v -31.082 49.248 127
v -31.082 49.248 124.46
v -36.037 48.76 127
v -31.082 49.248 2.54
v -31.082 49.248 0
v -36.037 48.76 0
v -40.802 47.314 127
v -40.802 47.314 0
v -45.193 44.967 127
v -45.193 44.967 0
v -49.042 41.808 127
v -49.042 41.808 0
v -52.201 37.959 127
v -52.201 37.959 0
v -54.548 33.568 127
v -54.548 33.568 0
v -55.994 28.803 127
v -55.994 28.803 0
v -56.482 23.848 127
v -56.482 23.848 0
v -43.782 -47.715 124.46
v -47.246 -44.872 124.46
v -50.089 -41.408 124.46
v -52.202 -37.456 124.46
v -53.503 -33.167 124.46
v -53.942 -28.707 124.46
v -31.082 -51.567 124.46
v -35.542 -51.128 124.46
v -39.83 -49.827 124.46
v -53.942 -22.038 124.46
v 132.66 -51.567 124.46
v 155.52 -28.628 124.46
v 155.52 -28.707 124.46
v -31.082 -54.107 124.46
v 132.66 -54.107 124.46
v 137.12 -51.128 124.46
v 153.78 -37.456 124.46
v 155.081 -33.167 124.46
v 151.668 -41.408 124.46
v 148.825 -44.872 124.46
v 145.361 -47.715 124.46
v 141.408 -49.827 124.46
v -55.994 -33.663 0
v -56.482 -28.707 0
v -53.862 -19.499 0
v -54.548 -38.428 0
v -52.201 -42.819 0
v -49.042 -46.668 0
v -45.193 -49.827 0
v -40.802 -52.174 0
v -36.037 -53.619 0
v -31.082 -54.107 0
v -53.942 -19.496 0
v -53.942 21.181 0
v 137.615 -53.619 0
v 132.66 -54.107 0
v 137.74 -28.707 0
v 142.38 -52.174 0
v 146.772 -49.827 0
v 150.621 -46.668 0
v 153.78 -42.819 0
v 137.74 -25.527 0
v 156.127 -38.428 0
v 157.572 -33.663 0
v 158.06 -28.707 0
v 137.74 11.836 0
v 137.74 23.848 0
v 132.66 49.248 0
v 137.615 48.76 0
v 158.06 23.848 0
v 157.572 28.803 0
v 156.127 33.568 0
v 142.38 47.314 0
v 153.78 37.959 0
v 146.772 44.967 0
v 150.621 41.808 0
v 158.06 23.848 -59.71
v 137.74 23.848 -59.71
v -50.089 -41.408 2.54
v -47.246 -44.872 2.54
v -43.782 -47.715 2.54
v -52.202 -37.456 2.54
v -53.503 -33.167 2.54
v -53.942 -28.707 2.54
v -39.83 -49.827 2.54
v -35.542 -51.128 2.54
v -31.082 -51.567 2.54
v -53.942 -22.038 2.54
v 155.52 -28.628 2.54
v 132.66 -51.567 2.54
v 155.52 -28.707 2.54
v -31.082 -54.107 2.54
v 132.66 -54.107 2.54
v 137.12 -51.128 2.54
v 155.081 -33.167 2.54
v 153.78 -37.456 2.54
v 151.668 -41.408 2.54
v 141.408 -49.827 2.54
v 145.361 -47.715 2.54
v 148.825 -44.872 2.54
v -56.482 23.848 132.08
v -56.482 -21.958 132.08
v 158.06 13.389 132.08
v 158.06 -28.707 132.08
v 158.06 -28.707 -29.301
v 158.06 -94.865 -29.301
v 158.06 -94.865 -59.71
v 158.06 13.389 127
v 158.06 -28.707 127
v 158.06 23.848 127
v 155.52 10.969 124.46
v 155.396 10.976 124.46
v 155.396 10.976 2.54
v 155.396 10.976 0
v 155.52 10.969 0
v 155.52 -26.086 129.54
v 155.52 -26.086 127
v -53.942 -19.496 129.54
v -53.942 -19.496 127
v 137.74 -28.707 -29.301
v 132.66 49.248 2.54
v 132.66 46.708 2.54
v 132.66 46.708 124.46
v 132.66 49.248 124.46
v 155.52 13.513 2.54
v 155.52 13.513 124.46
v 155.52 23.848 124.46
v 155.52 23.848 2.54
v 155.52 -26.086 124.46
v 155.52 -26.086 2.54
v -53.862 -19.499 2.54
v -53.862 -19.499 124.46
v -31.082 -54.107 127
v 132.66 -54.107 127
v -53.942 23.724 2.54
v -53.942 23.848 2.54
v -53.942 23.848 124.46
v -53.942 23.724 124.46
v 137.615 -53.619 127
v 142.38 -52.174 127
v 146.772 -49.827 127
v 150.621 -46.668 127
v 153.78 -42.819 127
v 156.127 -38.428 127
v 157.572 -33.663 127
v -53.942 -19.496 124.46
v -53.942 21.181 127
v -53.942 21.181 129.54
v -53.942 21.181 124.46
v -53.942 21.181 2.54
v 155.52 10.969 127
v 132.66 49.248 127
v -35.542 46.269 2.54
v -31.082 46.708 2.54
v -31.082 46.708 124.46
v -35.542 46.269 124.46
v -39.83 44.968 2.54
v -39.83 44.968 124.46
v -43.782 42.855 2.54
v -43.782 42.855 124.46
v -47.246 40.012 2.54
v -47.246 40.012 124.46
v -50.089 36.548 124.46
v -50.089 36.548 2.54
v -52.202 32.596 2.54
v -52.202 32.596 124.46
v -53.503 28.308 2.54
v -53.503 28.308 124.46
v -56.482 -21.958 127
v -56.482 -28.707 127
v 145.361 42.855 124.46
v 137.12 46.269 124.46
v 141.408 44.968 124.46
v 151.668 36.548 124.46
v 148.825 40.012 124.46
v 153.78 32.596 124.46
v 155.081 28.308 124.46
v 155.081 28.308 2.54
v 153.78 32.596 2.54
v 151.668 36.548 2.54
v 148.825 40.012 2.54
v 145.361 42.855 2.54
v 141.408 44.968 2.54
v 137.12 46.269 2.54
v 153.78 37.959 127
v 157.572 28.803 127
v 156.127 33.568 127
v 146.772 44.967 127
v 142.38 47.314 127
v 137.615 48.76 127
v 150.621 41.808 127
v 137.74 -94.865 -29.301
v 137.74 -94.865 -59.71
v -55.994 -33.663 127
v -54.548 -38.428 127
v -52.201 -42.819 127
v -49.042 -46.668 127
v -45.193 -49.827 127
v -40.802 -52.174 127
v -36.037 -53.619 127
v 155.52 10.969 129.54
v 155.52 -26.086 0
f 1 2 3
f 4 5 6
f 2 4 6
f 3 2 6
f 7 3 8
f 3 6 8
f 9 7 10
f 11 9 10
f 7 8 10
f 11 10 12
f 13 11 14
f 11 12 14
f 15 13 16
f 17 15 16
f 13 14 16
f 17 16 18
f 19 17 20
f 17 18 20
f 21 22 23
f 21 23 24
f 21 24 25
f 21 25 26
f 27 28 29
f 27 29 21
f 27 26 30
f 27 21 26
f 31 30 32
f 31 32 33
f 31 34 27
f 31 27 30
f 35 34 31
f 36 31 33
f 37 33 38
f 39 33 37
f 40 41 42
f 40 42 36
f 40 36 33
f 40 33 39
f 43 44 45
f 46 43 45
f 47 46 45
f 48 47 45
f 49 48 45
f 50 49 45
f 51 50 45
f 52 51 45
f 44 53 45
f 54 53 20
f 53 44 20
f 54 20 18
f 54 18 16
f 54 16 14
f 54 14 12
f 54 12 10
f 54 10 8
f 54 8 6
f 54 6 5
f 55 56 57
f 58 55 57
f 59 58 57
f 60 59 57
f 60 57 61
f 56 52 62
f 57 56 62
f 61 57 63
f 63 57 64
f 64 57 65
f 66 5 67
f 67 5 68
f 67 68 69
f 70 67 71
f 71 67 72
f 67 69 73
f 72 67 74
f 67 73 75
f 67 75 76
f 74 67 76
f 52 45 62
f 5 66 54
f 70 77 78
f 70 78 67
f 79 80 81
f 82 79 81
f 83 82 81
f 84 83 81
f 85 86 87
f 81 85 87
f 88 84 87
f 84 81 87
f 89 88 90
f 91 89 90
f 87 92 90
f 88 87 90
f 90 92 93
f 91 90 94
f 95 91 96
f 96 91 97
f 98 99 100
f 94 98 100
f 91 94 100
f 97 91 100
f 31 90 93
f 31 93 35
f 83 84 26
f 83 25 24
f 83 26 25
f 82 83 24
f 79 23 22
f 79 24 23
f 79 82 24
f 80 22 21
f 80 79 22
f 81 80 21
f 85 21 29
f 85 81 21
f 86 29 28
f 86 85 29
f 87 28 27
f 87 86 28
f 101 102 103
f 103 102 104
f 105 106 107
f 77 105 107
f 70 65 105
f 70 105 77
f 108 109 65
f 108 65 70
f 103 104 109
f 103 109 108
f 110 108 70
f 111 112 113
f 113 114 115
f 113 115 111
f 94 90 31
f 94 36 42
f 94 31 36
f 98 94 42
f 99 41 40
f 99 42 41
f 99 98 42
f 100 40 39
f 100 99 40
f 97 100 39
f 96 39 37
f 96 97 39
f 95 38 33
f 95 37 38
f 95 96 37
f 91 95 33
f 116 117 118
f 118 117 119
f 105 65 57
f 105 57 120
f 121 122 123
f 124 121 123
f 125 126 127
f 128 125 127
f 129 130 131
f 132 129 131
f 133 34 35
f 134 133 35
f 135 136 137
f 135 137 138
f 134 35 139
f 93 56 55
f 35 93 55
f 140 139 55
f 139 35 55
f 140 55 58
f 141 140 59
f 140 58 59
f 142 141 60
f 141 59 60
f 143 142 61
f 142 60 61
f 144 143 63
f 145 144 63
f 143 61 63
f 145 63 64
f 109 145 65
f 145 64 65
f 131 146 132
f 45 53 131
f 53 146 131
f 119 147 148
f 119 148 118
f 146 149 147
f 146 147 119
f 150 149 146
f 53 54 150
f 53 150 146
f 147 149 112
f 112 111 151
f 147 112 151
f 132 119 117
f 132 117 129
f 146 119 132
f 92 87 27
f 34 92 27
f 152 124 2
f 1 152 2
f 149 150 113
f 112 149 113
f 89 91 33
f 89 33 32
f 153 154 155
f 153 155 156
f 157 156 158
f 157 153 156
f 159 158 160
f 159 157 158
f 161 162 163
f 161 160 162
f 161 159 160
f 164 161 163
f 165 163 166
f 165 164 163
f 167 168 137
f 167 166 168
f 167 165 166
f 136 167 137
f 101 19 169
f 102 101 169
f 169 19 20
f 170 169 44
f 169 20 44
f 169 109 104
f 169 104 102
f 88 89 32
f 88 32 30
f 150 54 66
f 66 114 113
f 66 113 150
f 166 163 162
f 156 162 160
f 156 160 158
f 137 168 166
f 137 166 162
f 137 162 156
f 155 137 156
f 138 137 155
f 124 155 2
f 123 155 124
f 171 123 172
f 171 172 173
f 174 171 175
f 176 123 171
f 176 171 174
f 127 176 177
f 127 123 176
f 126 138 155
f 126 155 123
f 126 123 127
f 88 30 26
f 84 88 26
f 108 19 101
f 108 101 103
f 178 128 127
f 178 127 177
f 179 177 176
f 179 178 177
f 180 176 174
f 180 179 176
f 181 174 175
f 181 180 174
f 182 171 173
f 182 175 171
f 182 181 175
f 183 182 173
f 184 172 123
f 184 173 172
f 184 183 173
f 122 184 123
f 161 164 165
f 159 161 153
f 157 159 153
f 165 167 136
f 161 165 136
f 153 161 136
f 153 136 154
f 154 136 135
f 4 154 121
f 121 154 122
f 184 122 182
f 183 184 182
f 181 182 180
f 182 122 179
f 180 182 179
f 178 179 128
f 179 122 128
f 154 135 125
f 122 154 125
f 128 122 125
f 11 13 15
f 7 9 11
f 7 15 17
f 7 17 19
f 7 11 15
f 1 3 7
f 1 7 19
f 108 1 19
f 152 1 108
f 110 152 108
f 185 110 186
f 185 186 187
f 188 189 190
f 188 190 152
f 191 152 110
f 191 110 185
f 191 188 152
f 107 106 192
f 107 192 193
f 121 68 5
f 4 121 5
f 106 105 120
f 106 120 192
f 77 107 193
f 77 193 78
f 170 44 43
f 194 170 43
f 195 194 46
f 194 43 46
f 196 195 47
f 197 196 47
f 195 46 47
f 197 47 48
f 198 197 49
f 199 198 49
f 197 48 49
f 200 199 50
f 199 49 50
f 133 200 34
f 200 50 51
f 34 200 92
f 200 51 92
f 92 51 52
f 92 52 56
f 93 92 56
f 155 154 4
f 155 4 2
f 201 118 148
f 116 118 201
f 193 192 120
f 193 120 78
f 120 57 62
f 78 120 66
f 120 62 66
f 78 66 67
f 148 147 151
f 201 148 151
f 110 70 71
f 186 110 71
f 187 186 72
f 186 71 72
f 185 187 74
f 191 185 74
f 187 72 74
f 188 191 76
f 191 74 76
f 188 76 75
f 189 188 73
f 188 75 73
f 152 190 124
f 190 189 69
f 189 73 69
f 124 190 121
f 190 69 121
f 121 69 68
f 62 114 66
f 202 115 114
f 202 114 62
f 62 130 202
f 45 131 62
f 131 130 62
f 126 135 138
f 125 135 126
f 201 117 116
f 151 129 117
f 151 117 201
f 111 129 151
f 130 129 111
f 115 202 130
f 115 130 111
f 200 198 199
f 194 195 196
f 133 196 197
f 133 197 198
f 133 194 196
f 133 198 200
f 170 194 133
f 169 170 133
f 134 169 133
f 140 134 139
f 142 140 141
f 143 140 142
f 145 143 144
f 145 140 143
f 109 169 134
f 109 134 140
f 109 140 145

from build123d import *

# Parameters (mm, degrees)
F1_DEPTH     = 127
F2_T         = -2.54
F3_DEPTH     = 25.4
F5_DEPTH     = 132.08
F6_T         = 2.54
F6_T3_DEPTH  = 219.8768545095
F6_T5_DEPTH  = 219.7282038274
F6_T7_DEPTH  = 7.62
F6_T9_DEPTH  = 11.7497509401
F6_T11_DEPTH = 127
F6_T13_DEPTH = 214.6456904056
F6_T15_DEPTH = 5.1599103922
F6_T17_DEPTH = 7.62
F6_T19_DEPTH = 15.4153889552
F6_T21_DEPTH = 214.7908212861
F6_T23_DEPTH = 5.2038284596
F6_T26_ANGLE = 90.000000001
F6_T28_ANGLE = 90.000000001
F6_T30_ANGLE = 90.000000001
F6_T32_ANGLE = 90.000000001
F6_T34_ANGLE = 90.000000001
F6_T36_ANGLE = 90.000000001
F6_T38_ANGLE = 90.000000001
F6_T40_ANGLE = 90.000000001
F8_DEPTH     = 20.32


# Not quite as in the source:
# - a shell that OpenCascade refuses in one call is made with other operations: the cavity is built on its own and cut out


with BuildPart() as f1:
    # F0 (on Top) → F1 (new body)
    with BuildSketch(Plane.XY):
        with BuildLine():
            Line((132.6601760626, 49.2479032969), (-31.0818792045, 49.2479032969))
            ThreePointArc((-31.0818792045, 49.2479032969), (-49.0423914466, 41.8084155391), (-56.4818792045, 23.8479032969))
            Line((-56.4818792045, 23.8479032969), (158.0601760626, 23.8479032969))
            ThreePointArc((158.0601760626, 23.8479032969), (150.6206883047, 41.8084155391), (132.6601760626, 49.2479032969))
        make_face()
        Polygon((158.0601760626, 23.8479032969), (-56.4818792045, 23.8479032969), (-56.4818792045, -2.4297900897), (158.0601760626, -3.4250394454), align=None)
        Polygon((158.0601760626, -3.4250394454), (-56.4818792045, -2.4297900897), (-56.4818792045, -28.7074834764), (158.0601760626, -28.7074834764), align=None)
        with BuildLine():
            Line((158.0601760626, -28.7074834764), (-56.4818792045, -28.7074834764))
            ThreePointArc((-56.4818792045, -28.7074834764), (-49.0423914466, -46.6679957185), (-31.0818792045, -54.1074834764))
            Line((-31.0818792045, -54.1074834764), (132.6601760626, -54.1074834764))
            ThreePointArc((132.6601760626, -54.1074834764), (150.6206883047, -46.6679957185), (158.0601760626, -28.7074834764))
        make_face()
    extrude(amount=F1_DEPTH)

    # F2: a shell. OpenCascade refuses it in one call, so the cavity is built on its own and cut out:
    # the body offset inwards by the wall thickness, plus a prism from it out through each open face.
    f2_core = offset(f1.part, amount=F2_T, mode=Mode.PRIVATE)
    f2_exits = [f2_core.faces().sort_by_distance(p)[0] for p in [
        (50.789148, -51.567483, 63.5),
    ]]
    add(f2_core, mode=Mode.SUBTRACT)
    extrude(f2_exits, amount=-F2_T, mode=Mode.SUBTRACT)

    # F3 (cut): a face of the model
    f3_faces = [f1.faces().sort_by_distance(p)[0] for p in [
        (50.789148429, 46.7079032969, 63.5),
    ]]
    extrude(f3_faces, amount=-F3_DEPTH, mode=Mode.SUBTRACT)

    # F4 (on face) → F5 (join)
    with BuildSketch(Plane(origin=(0, 0, 0), x_dir=(1, 0, 0), z_dir=(0, 0, -1))):
        Polygon((158.0601760626, 28.7074834764), (-56.4818792045, 21.957822144), (-56.4818792045, -23.8479032969), (158.0601760626, -13.3886858821), align=None)
    extrude(amount=-F5_DEPTH)

    # F6: shell of thickness 2.54, made by hand


with BuildPart() as f6_core1:
    # F6_t2: copy of F1
    add(f1.part)

    # the walls: a layer under each face that stays
    f6_faces = [f6_core1.faces().sort_by_distance(p)[0] for p in [
        (-49.0423914466, 41.8084155391, 63.5),
        (50.789148429, 31.3182945895, 127),
        (50.789148429, 18.6182945895, 129.54),
        (50.789148429, -2.4297900897, 132.08),
        (50.789148429, -25.3326528102, 129.54),
        (50.789148429, -38.0326528102, 127),
        (-49.0423914466, -46.6679957185, 63.5),
        (-31.0818792045, -52.8374834764, 63.5),
        (-47.2463402224, -44.8719444943, 63.5),
        (-53.9418792045, -25.3726080063, 63.5),
        (50.789148429, -25.3326528102, 63.5),
        (155.5201760626, -28.6675282803, 63.5),
        (148.8246370805, -44.8719444943, 63.5),
        (132.6601760626, -52.8374834764, 63.5),
        (50.789148429, -38.0726080063, 124.46),
        (50.789148429, -38.0726080063, 2.54),
        (50.789148429, -54.1074834764, 1.27),
        (50.789148429, -54.1074834764, 125.73),
        (150.6206883047, -46.6679957185, 63.5),
        (158.0601760626, -2.4297900897, 66.04),
        (150.6206883047, 41.8084155391, 63.5),
        (132.6601760626, 47.9779032969, 63.5),
        (50.789148429, 31.3802088193, 2.54),
        (-47.2463402224, 40.0123643149, 63.5),
        (-53.9418792045, 23.7859890671, 63.5),
        (50.789148429, 18.6182945895, 63.5),
        (155.5201760626, 18.6802088193, 63.5),
        (50.789148429, 31.3802088193, 124.46),
        (148.8246370805, 40.0123643149, 63.5),
        (-56.4818792045, -2.4297900897, 66.04),
        (50.789148429, 49.2479032969, 125.73),
        (-31.0818792045, 47.9779032969, 63.5),
        (50.789148429, 49.2479032969, 1.27),
    ]]
    thicken(f6_faces, amount=-F6_T, mode=Mode.SUBTRACT)

    # F6_s4 → F6_t3 (cut)
    with BuildSketch(Plane(origin=(159.571223823, -7.779314508, 0), x_dir=(0, 0, 1), z_dir=(-0.9988137664, 0.0486935316, 0))):
        Polygon((127.0254, 21.0947119453), (124.46, 21.0693119453), (124.46, 18.5293119453), (127, 18.5293119453), align=None)
    extrude(amount=F6_T3_DEPTH, mode=Mode.SUBTRACT)

    # F6_s6 → F6_t5 (cut)
    with BuildSketch(Plane(origin=(-58.2746464734, 1.8333660851, 0), x_dir=(0, 0, 1), z_dir=(0.9995054766, -0.0314452262, 0))):
        Polygon((127.0254, 23.7484489574), (127, 21.1830489574), (124.46, 21.1830489574), (124.46, 23.7230489574), align=None)
    extrude(amount=F6_T5_DEPTH, mode=Mode.SUBTRACT)

    # F6_s8 → F6_t7 (cut)
    with BuildSketch(Plane.XZ.offset(49.0274834764)):
        Polygon((-31.0564792045, 2.5654), (-33.6218792045, 2.54), (-33.6218792045, 0), (-31.0818792045, 0), align=None)
        Polygon((-31.0564792045, 124.4346), (-33.6218792045, 124.46), (-33.6218792045, 127), (-31.0818792045, 127), align=None)
        Polygon((132.6347760626, 2.5654), (135.2001760626, 2.54), (135.2001760626, 0), (132.6601760626, 0), align=None)
        Polygon((132.6347760626, 124.4346), (135.2001760626, 124.46), (135.2001760626, 127), (132.6601760626, 127), align=None)
    extrude(amount=F6_T7_DEPTH, mode=Mode.SUBTRACT)

    # F6_s10 → F6_t9 (cut)
    with BuildSketch(Plane.XZ.offset(19.4977325363)):
        Polygon((-53.9164792045, 2.5654), (-56.4818792045, 2.54), (-56.4818792045, 0), (-53.9418792045, 0), align=None)
        Polygon((-53.9164792045, 124.4346), (-56.4818792045, 124.46), (-56.4818792045, 127), (-53.9418792045, 127), align=None)
    extrude(amount=F6_T9_DEPTH, mode=Mode.SUBTRACT)

    # F6_s12 → F6_t11 (cut)
    with BuildSketch(Plane.XY):
        Polygon((-53.9172779133, -22.0631199754), (-56.4818792045, -22.0377325363), (-56.4818792045, -19.4165654331), (-53.8620083299, -19.4989886257), align=None)
        Polygon((155.4939773538, -28.6529605233), (155.6000469372, -26.0888291736), (158.0601760626, -26.1662267655), (158.0601760626, -28.6275730842), align=None)
        Polygon((-53.9152423888, 23.749444707), (-56.4818792045, 23.7240748373), (-56.4818792045, 21.3048866852), (-54.0655607747, 21.1870878706), align=None)
        Polygon((155.4960128783, 13.5378842114), (155.3964944924, 10.975527375), (158.0601760626, 10.8456692704), (158.0601760626, 13.5125143417), align=None)
    extrude(amount=F6_T11_DEPTH, mode=Mode.SUBTRACT)

    # F6_s14 → F6_t13 (cut)
    with BuildSketch(Plane(origin=(-55.7346464734, 1.7534556929, 0), x_dir=(0, 0, 1), z_dir=(0.9995054766, -0.0314452262, 0))):
        Polygon((124.4346, 23.7484489574), (124.46, 21.1830489574), (127, 21.1830489574), (127, 23.7230489574), align=None)
        Polygon((2.5654, 23.7484489574), (2.54, 21.1830489574), (0, 21.1830489574), (0, 23.7230489574), align=None)
    extrude(amount=F6_T13_DEPTH, mode=Mode.SUBTRACT)

    # F6_s16 → F6_t15 (cut)
    with BuildSketch(Plane.XZ.offset(26.0875730842)):
        Polygon((155.4947760626, 124.4346), (158.0601760626, 124.46), (158.0601760626, 127), (155.5201760626, 127), align=None)
        Polygon((155.4947760626, 2.5654), (158.0601760626, 2.54), (158.0601760626, 0), (155.5201760626, 0), align=None)
    extrude(amount=F6_T15_DEPTH, mode=Mode.SUBTRACT)

    # F6_s18 → F6_t17 (cut)
    with BuildSketch(Plane.XZ.offset(-51.7879032969)):
        Polygon((132.6347760626, 124.4346), (135.2001760626, 124.46), (135.2001760626, 127), (132.6601760626, 127), align=None)
        Polygon((132.6347760626, 2.5654), (135.2001760626, 2.54), (135.2001760626, 0), (132.6601760626, 0), align=None)
        Polygon((-31.0564792045, 2.5654), (-31.0818792045, 0), (-33.6218792045, 0), (-33.6218792045, 2.54), align=None)
        Polygon((-31.0564792045, 124.4346), (-31.0818792045, 127), (-33.6218792045, 127), (-33.6218792045, 124.46), align=None)
    extrude(amount=F6_T17_DEPTH, mode=Mode.SUBTRACT)

    # F6_s20 → F6_t19 (cut)
    with BuildSketch(Plane.XZ.offset(-26.3879032969)):
        Polygon((155.4947760626, 2.5654), (155.5201760626, 0), (158.0601760626, 0), (158.0601760626, 2.54), align=None)
        Polygon((155.4947760626, 124.4346), (158.0601760626, 124.46), (158.0601760626, 127), (155.5201760626, 127), align=None)
    extrude(amount=F6_T19_DEPTH, mode=Mode.SUBTRACT)

    # F6_s22 → F6_t21 (cut)
    with BuildSketch(Plane(origin=(157.031223823, -7.6554860484, 0), x_dir=(0, 0, 1), z_dir=(-0.9988137664, 0.0486935316, 0))):
        Polygon((2.5654, 21.0947119453), (0, 21.0693119453), (0, 18.5293119453), (2.54, 18.5293119453), align=None)
        Polygon((124.4346, 21.0947119453), (124.46, 18.5293119453), (127, 18.5293119453), (127, 21.0693119453), align=None)
    extrude(amount=F6_T21_DEPTH, mode=Mode.SUBTRACT)

    # F6_s24 → F6_t23 (cut)
    with BuildSketch(Plane.XZ.offset(-26.3879032969)):
        Polygon((-53.9164792045, 2.5654), (-53.9418792045, 0), (-56.4818792045, 0), (-56.4818792045, 2.54), align=None)
        Polygon((-53.9164792045, 124.4346), (-56.4818792045, 124.46), (-56.4818792045, 127), (-53.9418792045, 127), align=None)
    extrude(amount=F6_T23_DEPTH, mode=Mode.SUBTRACT)

    # F6_s25 → F6_t26 (revolve, cut)
    with BuildSketch(Plane.YZ.offset(-31.0818792045)):
        Polygon((-51.5420834764, 124.4346), (-54.1074834764, 124.46), (-54.1074834764, 127), (-51.5674834764, 127), align=None)
    revolve(axis=Axis((-31.0818792045, -28.7074834764, 124.46), (0, 0, -1)), revolution_arc=F6_T26_ANGLE, mode=Mode.SUBTRACT)

    # F6_s27 → F6_t28 (revolve, cut)
    with BuildSketch(Plane.YZ.offset(-31.0818792045)):
        Polygon((-51.5420834764, 2.5654), (-54.1074834764, 2.54), (-54.1074834764, 0), (-51.5674834764, 0), align=None)
    revolve(axis=Axis((-31.0818792045, -28.7074834764, 2.54), (0, 0, -1)), revolution_arc=F6_T28_ANGLE, mode=Mode.SUBTRACT)

    # F6_s29 → F6_t30 (revolve, cut)
    with BuildSketch(Plane.XZ.offset(28.7074834764)):
        Polygon((155.4947760626, 124.4346), (158.0601760626, 124.46), (158.0601760626, 127), (155.5201760626, 127), align=None)
    revolve(axis=Axis((132.6601760626, -28.7074834764, 124.46), (0, 0, -1)), revolution_arc=F6_T30_ANGLE, mode=Mode.SUBTRACT)

    # F6_s31 → F6_t32 (revolve, cut)
    with BuildSketch(Plane.XZ.offset(28.7074834764)):
        Polygon((155.4947760626, 2.5654), (158.0601760626, 2.54), (158.0601760626, 0), (155.5201760626, 0), align=None)
    revolve(axis=Axis((132.6601760626, -28.7074834764, 2.54), (0, 0, -1)), revolution_arc=F6_T32_ANGLE, mode=Mode.SUBTRACT)

    # F6_s33 → F6_t34 (revolve, cut)
    with BuildSketch(Plane.YZ.offset(132.6601760626)):
        Polygon((46.6825032969, 2.5654), (46.7079032969, 0), (49.2479032969, 0), (49.2479032969, 2.54), align=None)
    revolve(axis=Axis((132.6601760626, 23.8479032969, 2.54), (0, 0, -1)), revolution_arc=F6_T34_ANGLE, mode=Mode.SUBTRACT)

    # F6_s35 → F6_t36 (revolve, cut)
    with BuildSketch(Plane.XZ.offset(-23.8479032969)):
        Polygon((-53.9164792045, 2.5654), (-53.9418792045, 0), (-56.4818792045, 0), (-56.4818792045, 2.54), align=None)
    revolve(axis=Axis((-31.0818792045, 23.8479032969, 2.54), (0, 0, -1)), revolution_arc=F6_T36_ANGLE, mode=Mode.SUBTRACT)

    # F6_s37 → F6_t38 (revolve, cut)
    with BuildSketch(Plane.XZ.offset(-23.8479032969)):
        Polygon((-53.9164792045, 124.4346), (-56.4818792045, 124.46), (-56.4818792045, 127), (-53.9418792045, 127), align=None)
    revolve(axis=Axis((-31.0818792045, 23.8479032969, 124.46), (0, 0, -1)), revolution_arc=F6_T38_ANGLE, mode=Mode.SUBTRACT)

    # F6_s39 → F6_t40 (revolve, cut)
    with BuildSketch(Plane.YZ.offset(132.6601760626)):
        Polygon((46.6825032969, 124.4346), (46.7079032969, 127), (49.2479032969, 127), (49.2479032969, 124.46), align=None)
    revolve(axis=Axis((132.6601760626, 23.8479032969, 124.46), (0, 0, -1)), revolution_arc=F6_T40_ANGLE, mode=Mode.SUBTRACT)


with BuildPart() as f1_1:
    add(f1.part)

    # what is left inside the walls is the cavity
    f6_cavity = [f6_core1.part.solids().sort_by_distance(p)[0] for p in [
        (15.877569, 17.751835, 64.77),
    ]]
    add(f6_cavity, mode=Mode.SUBTRACT)

    # F7 (on face) → F8 (join)
    with BuildSketch(Plane.YZ.offset(158.0601760626)):
        Polygon((23.8479032969, -59.71023524), (23.8479032969, 0), (-28.7074834764, 0), (-28.7074834764, -29.3008414079), (-94.8645432204, -29.3008414079), (-94.8645432204, -59.71023524), align=None)
    extrude(amount=-F8_DEPTH)


solid = f1_1.part
